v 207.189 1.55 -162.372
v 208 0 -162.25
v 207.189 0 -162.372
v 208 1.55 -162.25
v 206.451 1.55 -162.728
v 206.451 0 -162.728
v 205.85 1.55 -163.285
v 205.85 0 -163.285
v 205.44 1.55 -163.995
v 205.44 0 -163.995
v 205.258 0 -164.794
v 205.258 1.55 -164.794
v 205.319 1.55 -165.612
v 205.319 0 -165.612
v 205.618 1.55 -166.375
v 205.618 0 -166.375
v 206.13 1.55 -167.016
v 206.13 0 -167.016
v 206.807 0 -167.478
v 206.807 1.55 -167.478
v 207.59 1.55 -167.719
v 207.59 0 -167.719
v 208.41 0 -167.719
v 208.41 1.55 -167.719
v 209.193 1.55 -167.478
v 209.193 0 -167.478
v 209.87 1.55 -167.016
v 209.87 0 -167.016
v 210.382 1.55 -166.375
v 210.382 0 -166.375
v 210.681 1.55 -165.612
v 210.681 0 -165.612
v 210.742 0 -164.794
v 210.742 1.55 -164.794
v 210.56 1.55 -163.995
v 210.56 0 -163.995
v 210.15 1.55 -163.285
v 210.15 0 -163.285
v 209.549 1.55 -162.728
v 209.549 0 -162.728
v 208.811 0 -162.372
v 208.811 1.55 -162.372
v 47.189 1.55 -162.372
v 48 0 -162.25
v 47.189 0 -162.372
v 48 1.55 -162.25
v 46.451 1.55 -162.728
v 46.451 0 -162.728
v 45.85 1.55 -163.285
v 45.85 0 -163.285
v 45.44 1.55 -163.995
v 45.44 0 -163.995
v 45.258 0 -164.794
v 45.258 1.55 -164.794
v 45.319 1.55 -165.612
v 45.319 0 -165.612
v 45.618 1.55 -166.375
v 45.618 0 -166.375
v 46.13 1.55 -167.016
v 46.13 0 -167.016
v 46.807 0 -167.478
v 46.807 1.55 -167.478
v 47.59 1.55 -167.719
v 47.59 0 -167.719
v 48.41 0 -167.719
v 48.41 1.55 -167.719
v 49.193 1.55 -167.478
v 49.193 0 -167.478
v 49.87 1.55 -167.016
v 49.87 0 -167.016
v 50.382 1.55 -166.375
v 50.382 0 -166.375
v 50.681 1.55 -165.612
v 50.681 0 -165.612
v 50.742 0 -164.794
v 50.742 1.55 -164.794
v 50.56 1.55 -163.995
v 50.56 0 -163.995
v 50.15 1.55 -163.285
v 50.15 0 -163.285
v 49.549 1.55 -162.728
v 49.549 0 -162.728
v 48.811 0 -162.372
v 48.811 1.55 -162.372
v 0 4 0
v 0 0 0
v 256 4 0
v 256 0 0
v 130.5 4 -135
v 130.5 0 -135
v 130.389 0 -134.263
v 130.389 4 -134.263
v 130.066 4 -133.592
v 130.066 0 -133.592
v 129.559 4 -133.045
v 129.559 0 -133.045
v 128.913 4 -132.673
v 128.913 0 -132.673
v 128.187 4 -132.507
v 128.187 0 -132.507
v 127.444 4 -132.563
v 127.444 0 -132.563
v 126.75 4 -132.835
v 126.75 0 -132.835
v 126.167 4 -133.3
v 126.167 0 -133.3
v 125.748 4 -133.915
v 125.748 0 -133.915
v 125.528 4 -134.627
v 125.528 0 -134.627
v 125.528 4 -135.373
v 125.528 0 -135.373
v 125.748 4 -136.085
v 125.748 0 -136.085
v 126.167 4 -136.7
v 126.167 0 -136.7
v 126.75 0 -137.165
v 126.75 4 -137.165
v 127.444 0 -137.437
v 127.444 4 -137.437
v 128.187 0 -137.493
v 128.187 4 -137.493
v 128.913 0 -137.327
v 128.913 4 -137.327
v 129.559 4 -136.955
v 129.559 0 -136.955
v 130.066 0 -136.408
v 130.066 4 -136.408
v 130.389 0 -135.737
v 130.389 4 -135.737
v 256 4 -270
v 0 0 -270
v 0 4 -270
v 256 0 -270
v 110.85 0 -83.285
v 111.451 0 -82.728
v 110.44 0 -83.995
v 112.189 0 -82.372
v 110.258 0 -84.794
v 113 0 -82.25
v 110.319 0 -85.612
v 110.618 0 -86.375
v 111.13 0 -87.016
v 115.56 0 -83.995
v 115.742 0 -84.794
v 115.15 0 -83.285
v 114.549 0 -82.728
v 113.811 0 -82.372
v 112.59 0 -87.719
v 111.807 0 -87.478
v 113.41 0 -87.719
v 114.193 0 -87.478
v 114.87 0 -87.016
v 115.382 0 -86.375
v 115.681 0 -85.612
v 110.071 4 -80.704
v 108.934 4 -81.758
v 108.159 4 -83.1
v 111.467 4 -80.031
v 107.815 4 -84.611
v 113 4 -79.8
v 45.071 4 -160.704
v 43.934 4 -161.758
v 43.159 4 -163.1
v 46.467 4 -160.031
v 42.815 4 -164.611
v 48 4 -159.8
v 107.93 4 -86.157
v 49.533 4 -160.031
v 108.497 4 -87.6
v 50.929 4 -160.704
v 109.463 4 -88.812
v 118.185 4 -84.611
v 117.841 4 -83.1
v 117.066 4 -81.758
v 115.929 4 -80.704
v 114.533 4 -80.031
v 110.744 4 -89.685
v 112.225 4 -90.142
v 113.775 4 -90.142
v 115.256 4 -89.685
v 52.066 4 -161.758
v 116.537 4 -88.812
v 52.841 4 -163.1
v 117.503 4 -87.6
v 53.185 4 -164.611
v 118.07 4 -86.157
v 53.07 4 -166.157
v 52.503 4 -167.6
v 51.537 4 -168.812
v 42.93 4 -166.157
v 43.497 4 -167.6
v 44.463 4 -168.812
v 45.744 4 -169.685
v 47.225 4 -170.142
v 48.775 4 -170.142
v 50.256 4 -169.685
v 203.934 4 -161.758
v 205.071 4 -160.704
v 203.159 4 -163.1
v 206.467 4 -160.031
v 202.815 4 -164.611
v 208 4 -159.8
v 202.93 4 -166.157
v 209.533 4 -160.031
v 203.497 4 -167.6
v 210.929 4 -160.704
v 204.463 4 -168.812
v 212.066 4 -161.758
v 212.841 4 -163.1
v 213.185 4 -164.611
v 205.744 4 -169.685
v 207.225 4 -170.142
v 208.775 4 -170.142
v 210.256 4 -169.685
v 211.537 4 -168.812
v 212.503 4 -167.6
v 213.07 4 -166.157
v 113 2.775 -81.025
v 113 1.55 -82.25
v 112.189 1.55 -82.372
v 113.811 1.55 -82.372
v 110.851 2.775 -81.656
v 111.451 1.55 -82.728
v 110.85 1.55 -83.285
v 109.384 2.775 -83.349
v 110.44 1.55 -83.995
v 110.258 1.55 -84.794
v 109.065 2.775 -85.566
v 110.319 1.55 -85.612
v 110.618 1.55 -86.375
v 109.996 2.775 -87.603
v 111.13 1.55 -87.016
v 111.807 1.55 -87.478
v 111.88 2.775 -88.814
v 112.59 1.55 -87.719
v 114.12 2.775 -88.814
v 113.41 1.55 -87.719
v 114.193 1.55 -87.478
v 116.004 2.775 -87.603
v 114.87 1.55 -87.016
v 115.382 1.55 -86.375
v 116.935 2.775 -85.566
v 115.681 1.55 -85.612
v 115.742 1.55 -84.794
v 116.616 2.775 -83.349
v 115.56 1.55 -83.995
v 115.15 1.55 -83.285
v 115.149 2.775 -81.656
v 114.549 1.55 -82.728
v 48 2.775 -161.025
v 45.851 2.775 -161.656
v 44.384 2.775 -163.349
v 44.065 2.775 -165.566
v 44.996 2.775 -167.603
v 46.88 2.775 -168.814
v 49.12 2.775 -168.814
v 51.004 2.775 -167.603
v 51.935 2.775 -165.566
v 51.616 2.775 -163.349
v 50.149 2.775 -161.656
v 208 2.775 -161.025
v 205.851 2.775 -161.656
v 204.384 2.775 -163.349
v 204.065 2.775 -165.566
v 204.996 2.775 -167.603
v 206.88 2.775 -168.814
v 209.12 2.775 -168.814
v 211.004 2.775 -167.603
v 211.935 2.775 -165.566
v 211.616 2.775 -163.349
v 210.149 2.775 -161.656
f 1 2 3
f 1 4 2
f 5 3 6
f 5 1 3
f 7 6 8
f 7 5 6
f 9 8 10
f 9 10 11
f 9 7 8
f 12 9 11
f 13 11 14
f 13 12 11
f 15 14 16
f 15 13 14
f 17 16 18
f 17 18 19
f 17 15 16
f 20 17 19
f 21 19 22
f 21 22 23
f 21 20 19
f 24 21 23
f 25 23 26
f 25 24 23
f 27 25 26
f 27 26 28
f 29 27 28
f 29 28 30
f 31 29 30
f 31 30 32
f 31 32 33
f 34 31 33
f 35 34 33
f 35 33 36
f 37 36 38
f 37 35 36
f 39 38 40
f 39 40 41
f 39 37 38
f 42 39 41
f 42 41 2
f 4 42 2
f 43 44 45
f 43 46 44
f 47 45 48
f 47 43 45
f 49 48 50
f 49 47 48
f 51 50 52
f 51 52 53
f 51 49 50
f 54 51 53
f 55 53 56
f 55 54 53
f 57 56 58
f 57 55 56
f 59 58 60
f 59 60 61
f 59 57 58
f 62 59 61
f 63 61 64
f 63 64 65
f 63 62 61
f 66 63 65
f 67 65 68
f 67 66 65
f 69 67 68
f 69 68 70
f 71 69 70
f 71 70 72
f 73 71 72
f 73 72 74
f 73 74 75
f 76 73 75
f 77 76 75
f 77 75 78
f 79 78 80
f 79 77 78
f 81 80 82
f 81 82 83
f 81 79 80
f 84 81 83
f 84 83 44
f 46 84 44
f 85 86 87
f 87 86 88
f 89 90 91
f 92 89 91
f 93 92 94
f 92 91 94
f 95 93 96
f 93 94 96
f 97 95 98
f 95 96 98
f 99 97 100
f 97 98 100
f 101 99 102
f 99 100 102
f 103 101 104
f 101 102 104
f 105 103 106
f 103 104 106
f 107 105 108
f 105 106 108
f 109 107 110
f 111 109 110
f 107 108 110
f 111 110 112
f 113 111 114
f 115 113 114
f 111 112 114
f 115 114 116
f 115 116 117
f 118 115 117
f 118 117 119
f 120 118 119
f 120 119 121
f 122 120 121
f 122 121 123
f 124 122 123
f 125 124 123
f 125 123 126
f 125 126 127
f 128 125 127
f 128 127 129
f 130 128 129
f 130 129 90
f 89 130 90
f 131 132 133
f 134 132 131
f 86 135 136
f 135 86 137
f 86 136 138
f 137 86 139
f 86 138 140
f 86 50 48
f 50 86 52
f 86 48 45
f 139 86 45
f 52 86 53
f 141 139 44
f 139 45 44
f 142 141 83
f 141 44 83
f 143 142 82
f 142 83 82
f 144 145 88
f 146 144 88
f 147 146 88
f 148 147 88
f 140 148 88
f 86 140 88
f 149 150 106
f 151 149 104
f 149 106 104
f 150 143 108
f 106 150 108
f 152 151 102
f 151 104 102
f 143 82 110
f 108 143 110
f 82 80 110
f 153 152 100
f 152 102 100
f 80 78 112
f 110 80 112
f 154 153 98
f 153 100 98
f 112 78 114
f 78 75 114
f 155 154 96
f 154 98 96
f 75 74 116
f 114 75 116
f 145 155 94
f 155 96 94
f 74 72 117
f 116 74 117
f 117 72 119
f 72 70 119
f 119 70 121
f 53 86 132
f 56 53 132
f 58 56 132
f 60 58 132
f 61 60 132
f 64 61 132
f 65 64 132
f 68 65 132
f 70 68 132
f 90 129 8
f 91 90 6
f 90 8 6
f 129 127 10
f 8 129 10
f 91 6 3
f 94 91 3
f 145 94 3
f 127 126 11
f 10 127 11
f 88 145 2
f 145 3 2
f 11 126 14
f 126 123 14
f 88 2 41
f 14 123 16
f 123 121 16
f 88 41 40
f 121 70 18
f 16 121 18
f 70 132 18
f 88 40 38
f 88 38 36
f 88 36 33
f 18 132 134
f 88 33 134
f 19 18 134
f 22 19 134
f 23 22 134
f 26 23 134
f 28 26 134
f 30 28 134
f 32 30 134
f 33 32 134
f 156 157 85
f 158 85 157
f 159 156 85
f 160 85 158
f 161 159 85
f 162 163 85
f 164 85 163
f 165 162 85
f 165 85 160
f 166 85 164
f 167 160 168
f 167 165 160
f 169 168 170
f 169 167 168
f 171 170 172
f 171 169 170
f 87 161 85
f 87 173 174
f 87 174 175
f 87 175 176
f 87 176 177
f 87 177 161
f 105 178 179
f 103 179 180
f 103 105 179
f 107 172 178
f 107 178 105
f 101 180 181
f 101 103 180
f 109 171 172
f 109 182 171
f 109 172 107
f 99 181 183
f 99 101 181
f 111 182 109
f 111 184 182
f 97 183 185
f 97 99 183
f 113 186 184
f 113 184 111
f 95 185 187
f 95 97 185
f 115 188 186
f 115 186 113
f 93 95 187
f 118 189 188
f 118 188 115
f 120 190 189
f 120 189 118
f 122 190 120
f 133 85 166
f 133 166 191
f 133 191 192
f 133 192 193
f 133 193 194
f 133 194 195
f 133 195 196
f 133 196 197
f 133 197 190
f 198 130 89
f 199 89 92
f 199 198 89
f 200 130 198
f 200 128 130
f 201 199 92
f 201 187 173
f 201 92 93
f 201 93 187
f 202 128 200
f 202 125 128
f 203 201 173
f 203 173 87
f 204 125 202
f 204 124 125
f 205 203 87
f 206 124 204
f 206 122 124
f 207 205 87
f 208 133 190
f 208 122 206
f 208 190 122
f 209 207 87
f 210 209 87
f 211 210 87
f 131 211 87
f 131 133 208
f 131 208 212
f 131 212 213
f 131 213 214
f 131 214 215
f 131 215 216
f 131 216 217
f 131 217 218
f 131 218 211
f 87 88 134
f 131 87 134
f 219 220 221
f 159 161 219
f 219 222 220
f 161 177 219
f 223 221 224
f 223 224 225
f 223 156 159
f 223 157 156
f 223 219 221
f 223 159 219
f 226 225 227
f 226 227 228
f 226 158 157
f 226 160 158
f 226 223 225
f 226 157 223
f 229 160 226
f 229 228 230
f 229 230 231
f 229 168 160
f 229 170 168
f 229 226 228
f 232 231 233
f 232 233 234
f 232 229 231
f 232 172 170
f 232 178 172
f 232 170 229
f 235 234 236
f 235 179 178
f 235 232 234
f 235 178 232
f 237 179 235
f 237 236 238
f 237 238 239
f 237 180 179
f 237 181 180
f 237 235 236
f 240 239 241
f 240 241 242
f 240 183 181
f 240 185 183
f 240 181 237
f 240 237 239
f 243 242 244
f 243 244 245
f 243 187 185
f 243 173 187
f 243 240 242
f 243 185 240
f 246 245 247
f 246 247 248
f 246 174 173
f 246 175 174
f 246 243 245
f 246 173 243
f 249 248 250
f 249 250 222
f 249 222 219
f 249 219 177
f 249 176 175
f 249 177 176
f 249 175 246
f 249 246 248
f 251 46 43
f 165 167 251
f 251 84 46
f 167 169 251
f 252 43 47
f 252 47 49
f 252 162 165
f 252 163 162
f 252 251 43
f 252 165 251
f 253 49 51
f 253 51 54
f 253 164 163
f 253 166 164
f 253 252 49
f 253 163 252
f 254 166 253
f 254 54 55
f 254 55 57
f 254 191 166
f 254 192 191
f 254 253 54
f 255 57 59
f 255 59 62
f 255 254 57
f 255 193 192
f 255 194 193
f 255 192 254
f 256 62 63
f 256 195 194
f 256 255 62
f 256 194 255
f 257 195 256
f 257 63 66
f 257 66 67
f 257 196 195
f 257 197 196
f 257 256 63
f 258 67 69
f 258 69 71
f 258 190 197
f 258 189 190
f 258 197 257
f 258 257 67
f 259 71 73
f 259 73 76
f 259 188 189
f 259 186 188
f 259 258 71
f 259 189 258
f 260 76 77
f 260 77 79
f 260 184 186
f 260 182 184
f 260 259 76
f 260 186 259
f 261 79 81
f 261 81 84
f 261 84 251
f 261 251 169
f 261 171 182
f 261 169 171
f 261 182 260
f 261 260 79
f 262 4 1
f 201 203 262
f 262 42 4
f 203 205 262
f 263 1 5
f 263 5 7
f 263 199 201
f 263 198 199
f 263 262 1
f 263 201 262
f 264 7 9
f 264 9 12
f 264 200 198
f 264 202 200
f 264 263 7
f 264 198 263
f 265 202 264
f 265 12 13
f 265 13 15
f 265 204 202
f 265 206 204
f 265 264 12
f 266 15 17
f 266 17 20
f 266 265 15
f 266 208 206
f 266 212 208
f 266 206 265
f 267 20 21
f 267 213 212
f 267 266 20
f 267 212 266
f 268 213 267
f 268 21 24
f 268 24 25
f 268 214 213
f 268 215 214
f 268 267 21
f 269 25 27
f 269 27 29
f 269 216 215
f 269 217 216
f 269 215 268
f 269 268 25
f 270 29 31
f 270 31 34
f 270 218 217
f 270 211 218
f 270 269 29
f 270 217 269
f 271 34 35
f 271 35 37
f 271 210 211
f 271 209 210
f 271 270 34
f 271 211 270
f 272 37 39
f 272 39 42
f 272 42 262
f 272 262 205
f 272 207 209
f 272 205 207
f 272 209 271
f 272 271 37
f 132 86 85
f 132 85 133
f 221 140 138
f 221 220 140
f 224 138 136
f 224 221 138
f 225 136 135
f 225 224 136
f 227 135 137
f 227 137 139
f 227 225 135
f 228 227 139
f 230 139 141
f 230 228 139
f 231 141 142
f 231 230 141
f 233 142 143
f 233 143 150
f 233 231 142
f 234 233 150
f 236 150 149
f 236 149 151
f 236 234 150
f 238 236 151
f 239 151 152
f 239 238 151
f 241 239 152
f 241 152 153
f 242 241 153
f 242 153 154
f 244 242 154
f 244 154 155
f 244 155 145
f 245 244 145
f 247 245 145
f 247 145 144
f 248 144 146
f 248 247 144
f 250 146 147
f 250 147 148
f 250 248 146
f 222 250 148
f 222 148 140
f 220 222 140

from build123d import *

# Parameters (mm, degrees)
SKETCH1_W                                      = 256
SKETCH1_H                                      = 270
BOSS_EXTRUDE1_DEPTH                            = 4
CSK_FOR_M5_FLAT_HEAD_MACHINE_SCREW1_AT_2_COUNT = 2
CSK_FOR_M5_FLAT_HEAD_MACHINE_SCREW1_AT_2_PITCH = 124.197423484
CSK_FOR_M5_FLAT_HEAD_MACHINE_SCREW1_AT_3_COUNT = 2
CSK_FOR_M5_FLAT_HEAD_MACHINE_SCREW1_AT_3_PITCH = 103.07764064
M6_TAPED_HOLE_THRMOCOUPLER_D                   = 5


with BuildPart() as part:
    # Sketch1 → Boss-Extrude1 (new body)
    with BuildSketch(Plane(origin=(0, 0, 0), x_dir=(1, 0, 0), z_dir=(0, 1, 0))):
        with Locations((128, 135)):
            Rectangle(SKETCH1_W, SKETCH1_H)
    extrude(amount=BOSS_EXTRUDE1_DEPTH)

    # Sketch2 → CSK for M5 Flat Head Machine Screw1 (revolve, cut)
    with BuildSketch(Plane(origin=(113, 4, -85), x_dir=(0, 0, 1), z_dir=(1, 0, 0))):
        Polygon((0, 0), (0, 4), (2.75, 4), (2.75, 2.45), (5.2, 0), align=None)
    csk_for_m5_flat_head_machine_screw1 = revolve(axis=Axis((113, 10.35, -85), (0, -1, 0)), mode=Mode.SUBTRACT)

    # CSK for M5 Flat Head Machine Screw1 at 2: CSK for M5 Flat Head Machine Screw1 ×2
    with Locations(*[Vector(0.7649111981170511, 0, -0.6441357457827795) * (i * CSK_FOR_M5_FLAT_HEAD_MACHINE_SCREW1_AT_2_PITCH) for i in range(1, CSK_FOR_M5_FLAT_HEAD_MACHINE_SCREW1_AT_2_COUNT)]):
        add(csk_for_m5_flat_head_machine_screw1, mode=Mode.SUBTRACT)

    # CSK for M5 Flat Head Machine Screw1 at 3: CSK for M5 Flat Head Machine Screw1 ×2
    with Locations(*[Vector(-0.6305926250944657, 0, -0.7761140001162656) * (i * CSK_FOR_M5_FLAT_HEAD_MACHINE_SCREW1_AT_3_PITCH) for i in range(1, CSK_FOR_M5_FLAT_HEAD_MACHINE_SCREW1_AT_3_COUNT)]):
        add(csk_for_m5_flat_head_machine_screw1, mode=Mode.SUBTRACT)

    # M6 taped hole - thrmocoupler (through all)
    with Locations(Plane(origin=(0, 4, 0), x_dir=(-1, 0, 0), z_dir=(0, 1, 0))):
        with Locations((-128, -135)):
            Hole(M6_TAPED_HOLE_THRMOCOUPLER_D / 2)


solid = part.part
